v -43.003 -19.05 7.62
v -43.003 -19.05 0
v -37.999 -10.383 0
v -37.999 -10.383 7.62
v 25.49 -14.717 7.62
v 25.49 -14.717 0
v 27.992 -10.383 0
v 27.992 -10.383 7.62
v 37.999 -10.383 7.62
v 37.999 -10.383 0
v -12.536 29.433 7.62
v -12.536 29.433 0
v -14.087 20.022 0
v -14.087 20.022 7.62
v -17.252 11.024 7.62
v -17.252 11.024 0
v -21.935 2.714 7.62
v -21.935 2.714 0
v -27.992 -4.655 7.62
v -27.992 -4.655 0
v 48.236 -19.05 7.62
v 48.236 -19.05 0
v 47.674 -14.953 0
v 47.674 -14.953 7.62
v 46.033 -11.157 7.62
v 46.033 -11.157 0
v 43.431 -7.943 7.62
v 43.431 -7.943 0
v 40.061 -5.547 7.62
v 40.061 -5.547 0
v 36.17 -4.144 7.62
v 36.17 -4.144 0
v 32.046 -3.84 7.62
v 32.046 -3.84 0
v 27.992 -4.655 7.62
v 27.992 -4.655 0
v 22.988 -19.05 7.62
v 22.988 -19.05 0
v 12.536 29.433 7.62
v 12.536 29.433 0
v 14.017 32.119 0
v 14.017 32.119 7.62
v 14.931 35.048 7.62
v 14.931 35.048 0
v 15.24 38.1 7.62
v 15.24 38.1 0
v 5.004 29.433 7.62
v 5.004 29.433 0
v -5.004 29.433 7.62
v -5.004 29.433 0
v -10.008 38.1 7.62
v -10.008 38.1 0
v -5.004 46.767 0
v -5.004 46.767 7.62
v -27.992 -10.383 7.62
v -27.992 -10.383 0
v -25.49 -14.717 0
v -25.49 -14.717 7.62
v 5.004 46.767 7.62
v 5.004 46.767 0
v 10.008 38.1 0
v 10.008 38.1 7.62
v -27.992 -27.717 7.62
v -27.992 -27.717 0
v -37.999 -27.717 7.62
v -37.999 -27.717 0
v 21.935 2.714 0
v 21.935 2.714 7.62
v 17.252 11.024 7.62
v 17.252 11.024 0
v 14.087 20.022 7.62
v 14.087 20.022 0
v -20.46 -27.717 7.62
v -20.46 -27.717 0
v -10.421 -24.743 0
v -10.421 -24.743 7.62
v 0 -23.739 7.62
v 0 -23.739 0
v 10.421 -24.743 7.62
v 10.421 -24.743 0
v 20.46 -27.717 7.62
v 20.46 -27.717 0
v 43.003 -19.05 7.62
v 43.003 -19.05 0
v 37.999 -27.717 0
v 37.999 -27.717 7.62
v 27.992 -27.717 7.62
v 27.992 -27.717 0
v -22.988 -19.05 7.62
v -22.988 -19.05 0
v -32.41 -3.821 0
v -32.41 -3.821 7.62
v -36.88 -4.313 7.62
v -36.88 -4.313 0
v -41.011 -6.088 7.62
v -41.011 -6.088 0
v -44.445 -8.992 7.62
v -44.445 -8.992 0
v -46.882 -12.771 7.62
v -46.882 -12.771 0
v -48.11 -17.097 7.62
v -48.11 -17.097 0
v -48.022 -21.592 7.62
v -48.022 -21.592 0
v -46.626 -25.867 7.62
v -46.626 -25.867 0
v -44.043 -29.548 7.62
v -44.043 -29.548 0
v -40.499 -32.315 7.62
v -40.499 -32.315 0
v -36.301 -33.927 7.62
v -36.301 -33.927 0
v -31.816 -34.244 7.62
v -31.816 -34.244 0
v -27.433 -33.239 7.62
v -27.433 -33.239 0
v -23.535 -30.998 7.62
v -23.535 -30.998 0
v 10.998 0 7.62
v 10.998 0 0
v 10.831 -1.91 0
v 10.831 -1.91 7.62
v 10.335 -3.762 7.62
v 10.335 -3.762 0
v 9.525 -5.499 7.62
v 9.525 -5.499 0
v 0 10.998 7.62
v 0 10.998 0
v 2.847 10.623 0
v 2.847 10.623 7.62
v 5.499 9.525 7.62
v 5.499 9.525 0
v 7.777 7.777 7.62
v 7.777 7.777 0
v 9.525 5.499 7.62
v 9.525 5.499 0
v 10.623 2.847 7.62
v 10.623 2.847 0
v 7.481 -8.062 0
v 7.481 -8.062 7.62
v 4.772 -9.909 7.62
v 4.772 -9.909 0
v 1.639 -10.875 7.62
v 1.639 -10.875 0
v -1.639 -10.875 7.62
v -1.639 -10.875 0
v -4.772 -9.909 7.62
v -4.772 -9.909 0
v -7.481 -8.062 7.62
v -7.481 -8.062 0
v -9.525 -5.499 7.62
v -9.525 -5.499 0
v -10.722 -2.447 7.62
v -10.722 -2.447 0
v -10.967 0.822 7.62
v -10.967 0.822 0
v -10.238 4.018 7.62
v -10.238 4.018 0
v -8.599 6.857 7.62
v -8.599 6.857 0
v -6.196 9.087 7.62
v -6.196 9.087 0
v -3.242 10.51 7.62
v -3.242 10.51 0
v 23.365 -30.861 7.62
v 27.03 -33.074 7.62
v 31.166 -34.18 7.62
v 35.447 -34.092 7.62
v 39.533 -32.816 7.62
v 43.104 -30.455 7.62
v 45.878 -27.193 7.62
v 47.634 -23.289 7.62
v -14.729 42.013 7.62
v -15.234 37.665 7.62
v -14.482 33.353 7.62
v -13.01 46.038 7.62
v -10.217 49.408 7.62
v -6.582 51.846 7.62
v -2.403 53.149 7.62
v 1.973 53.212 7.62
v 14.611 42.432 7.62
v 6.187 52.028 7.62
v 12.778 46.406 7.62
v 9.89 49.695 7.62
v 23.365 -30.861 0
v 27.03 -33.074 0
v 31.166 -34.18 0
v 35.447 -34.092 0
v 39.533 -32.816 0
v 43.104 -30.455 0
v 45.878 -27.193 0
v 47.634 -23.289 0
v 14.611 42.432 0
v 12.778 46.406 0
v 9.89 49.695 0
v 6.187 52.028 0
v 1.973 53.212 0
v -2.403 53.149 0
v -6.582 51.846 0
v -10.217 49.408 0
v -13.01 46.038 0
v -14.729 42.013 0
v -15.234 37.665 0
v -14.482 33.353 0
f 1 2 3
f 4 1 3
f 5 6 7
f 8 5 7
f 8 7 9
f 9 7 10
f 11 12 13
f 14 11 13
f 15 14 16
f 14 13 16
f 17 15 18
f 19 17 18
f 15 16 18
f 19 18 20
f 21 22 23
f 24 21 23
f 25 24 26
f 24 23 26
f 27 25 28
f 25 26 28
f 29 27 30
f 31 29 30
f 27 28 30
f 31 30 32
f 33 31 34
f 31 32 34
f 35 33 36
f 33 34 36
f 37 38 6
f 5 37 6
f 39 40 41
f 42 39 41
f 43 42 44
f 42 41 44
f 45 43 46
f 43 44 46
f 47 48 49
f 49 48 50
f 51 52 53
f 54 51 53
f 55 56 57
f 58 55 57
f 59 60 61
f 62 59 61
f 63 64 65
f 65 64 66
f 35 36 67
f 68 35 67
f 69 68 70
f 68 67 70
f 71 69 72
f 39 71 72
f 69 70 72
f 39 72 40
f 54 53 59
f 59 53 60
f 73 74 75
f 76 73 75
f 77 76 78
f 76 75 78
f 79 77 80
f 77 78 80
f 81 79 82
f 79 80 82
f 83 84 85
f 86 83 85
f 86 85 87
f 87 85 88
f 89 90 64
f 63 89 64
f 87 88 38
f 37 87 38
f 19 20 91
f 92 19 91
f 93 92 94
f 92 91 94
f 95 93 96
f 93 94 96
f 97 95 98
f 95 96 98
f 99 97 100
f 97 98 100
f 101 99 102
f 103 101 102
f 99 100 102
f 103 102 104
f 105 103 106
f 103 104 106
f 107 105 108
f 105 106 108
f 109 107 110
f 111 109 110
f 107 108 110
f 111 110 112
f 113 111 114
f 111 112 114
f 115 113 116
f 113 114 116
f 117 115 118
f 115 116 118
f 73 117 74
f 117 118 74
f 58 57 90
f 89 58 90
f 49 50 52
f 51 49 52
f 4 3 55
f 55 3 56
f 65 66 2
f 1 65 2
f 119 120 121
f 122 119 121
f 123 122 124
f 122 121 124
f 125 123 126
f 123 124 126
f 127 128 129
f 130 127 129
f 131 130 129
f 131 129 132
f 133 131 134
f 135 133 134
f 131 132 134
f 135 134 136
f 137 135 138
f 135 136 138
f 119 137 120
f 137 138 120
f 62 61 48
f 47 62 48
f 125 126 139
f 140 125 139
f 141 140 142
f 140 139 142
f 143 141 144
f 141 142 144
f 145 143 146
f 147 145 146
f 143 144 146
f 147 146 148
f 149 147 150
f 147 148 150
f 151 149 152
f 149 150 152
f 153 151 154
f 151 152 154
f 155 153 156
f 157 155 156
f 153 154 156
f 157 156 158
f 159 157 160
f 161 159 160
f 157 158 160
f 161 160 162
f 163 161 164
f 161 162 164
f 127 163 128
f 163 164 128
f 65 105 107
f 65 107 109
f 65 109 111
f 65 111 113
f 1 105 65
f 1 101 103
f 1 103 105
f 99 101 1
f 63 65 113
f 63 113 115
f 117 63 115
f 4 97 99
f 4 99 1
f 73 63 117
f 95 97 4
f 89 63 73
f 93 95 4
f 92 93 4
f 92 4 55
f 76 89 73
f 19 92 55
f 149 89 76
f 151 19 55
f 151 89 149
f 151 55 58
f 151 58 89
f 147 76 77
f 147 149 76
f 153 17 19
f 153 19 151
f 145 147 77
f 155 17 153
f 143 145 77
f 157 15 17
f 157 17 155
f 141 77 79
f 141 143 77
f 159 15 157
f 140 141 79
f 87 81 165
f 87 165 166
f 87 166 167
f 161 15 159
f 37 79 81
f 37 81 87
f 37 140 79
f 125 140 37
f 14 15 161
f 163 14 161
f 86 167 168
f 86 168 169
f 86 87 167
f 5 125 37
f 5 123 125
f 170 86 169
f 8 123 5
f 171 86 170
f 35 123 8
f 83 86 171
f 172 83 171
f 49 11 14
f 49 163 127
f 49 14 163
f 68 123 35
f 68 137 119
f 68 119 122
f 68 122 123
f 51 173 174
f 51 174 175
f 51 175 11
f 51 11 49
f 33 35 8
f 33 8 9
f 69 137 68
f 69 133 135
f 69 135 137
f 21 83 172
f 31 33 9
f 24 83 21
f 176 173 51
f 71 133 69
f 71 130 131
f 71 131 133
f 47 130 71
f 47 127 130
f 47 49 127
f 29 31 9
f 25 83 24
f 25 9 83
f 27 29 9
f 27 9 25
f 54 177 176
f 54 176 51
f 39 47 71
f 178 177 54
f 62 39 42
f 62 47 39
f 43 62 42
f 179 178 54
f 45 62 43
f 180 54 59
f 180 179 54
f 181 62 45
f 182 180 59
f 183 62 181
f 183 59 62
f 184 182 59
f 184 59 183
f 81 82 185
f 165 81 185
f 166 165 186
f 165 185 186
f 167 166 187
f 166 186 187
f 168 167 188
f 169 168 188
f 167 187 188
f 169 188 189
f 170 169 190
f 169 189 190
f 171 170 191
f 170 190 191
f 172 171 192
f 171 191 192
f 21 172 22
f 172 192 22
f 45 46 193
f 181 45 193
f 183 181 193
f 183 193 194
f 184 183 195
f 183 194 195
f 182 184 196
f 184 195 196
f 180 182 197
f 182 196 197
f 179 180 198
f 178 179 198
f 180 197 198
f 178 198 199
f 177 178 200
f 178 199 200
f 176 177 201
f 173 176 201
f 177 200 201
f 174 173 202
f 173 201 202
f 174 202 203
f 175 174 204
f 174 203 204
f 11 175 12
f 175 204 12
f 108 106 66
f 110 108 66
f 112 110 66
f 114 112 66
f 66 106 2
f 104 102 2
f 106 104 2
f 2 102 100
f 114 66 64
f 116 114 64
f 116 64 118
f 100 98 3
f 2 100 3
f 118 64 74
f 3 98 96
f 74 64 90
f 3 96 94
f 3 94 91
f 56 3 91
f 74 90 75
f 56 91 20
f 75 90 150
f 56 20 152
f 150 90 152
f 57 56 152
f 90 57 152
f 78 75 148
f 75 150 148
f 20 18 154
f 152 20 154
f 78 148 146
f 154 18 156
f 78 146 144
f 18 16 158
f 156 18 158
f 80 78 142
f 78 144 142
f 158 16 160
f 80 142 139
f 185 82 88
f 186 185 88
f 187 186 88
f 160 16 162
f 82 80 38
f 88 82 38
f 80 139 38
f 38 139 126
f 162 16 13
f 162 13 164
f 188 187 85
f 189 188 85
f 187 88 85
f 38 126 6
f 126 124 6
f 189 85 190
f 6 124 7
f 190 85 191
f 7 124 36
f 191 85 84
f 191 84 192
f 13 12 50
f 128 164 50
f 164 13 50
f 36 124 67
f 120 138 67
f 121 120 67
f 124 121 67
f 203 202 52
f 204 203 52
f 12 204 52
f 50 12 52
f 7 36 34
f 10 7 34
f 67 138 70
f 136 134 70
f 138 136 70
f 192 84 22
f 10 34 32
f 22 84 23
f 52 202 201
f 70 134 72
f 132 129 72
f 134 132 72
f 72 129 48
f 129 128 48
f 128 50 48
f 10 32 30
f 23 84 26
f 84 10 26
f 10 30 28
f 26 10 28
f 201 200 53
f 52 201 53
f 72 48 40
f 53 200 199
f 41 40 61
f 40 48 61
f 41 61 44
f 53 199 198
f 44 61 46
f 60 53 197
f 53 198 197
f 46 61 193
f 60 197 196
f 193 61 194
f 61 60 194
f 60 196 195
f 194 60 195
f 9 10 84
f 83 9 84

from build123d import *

# Parameters (mm, degrees)
F1_DEPTH = 7.62


# Not quite as in the source:
# - a feature names something its author has since deleted; it is built from what else it names


with BuildPart() as f1:
    # F0 (on Top) → F1 (new body)
    with BuildSketch(Plane.XY):
        with BuildLine():
            ThreePointArc((-12.5356913124, 29.4331641691), (-7.0772530666, 24.60295999), (0, 22.86))
            ThreePointArc((0, 22.86), (7.0772530666, 24.60295999), (12.5356913124, 29.4331641691))
            ThreePointArc((12.5356913124, 29.4331641691), (14.5482221526, 33.5605251185), (15.24, 38.1))
            ThreePointArc((15.24, 38.1), (-4.5394748815, 52.6482221526), (-12.5356913124, 29.4331641691))
        make_face()
        Polygon((5.0038, 29.4331641691), (0, 29.4331641691), (-5.0038, 29.4331641691), (-10.0076, 38.1), (-5.0038, 46.7668358309), (5.0038, 46.7668358309), (10.0076, 38.1), align=None, mode=Mode.SUBTRACT)
        with BuildLine():
            ThreePointArc((27.9917678842, -4.654876327), (23.2845420207, -7.3046359495), (19.7973407305, -11.43))
            ThreePointArc((19.7973407305, -11.43), (17.7681618263, -19.6694390603), (20.4598765718, -27.7168358309))
            ThreePointArc((20.4598765718, -27.7168358309), (37.5350427657, -33.5982221526), (48.2355678842, -19.05))
            ThreePointArc((48.2355678842, -19.05), (41.8273199187, -6.6299454107), (27.9917678842, -4.654876327))
        make_face()
        Polygon((22.9879678842, -19.05), (25.4898678842, -14.7165820845), (27.9917678842, -10.3831641691), (37.9993678842, -10.3831641691), (43.0031678842, -19.05), (37.9993678842, -27.7168358309), (27.9917678842, -27.7168358309), align=None, mode=Mode.SUBTRACT)
        with BuildLine():
            ThreePointArc((-17.7555678842, -19.05), (-18.2748582915, -15.1055977526), (-19.7973407305, -11.43))
            ThreePointArc((-19.7973407305, -11.43), (-23.2845420207, -7.3046359495), (-27.9917678842, -4.654876327))
            ThreePointArc((-27.9917678842, -4.654876327), (-47.4825252222, -23.7813493938), (-20.4598765718, -27.7168358309))
            ThreePointArc((-20.4598765718, -27.7168358309), (-18.4473457316, -23.5894748815), (-17.7555678842, -19.05))
        make_face()
        Polygon((-27.9917678842, -10.3831641691), (-25.4898678842, -14.7165820845), (-22.9879678842, -19.05), (-27.9917678842, -27.7168358309), (-37.9993678842, -27.7168358309), (-43.0031678842, -19.05), (-37.9993678842, -10.3831641691), align=None, mode=Mode.SUBTRACT)
        with BuildLine():
            ThreePointArc((-9.5247205959, -5.4991), (-9.5247205959, 5.4991), (0, 10.9982))
            Line((0, 10.9982), (0, 22.86))
            ThreePointArc((0, 22.86), (-7.0772530666, 24.60295999), (-12.5356913124, 29.4331641691))
            ThreePointArc((-12.5356913124, 29.4331641691), (-17.2521616486, 11.0236496258), (-27.9917678842, -4.654876327))
            ThreePointArc((-27.9917678842, -4.654876327), (-23.2845420207, -7.3046359495), (-19.7973407305, -11.43))
            Line((-19.7973407305, -11.43), (-9.5247205959, -5.4991))
        make_face()
        with BuildLine():
            Line((0, 22.86), (0, 10.9982))
            ThreePointArc((0, 10.9982), (7.7769018008, 7.7769018008), (10.9982, 0))
            ThreePointArc((10.9982, 0), (10.6234454227, -2.8465436218), (9.5247205959, -5.4991))
            Line((9.5247205959, -5.4991), (19.7973407305, -11.43))
            ThreePointArc((19.7973407305, -11.43), (23.2845420207, -7.3046359495), (27.9917678842, -4.654876327))
            ThreePointArc((27.9917678842, -4.654876327), (17.2521616486, 11.0236496258), (12.5356913124, 29.4331641691))
            ThreePointArc((12.5356913124, 29.4331641691), (7.0772530666, 24.60295999), (0, 22.86))
        make_face()
        with BuildLine():
            ThreePointArc((9.5247205959, -5.4991), (0, -10.9982), (-9.5247205959, -5.4991))
            Line((-9.5247205959, -5.4991), (-19.7973407305, -11.43))
            ThreePointArc((-19.7973407305, -11.43), (-18.2748582915, -15.1055977526), (-17.7555678842, -19.05))
            ThreePointArc((-17.7555678842, -19.05), (-18.4473457316, -23.5894748815), (-20.4598765718, -27.7168358309))
            ThreePointArc((-20.4598765718, -27.7168358309), (0, -23.7392913379), (20.4598765718, -27.7168358309))
            ThreePointArc((20.4598765718, -27.7168358309), (17.7681618263, -19.6694390603), (19.7973407305, -11.43))
            Line((19.7973407305, -11.43), (9.5247205959, -5.4991))
        make_face()
    extrude(amount=F1_DEPTH)


solid = f1.part
